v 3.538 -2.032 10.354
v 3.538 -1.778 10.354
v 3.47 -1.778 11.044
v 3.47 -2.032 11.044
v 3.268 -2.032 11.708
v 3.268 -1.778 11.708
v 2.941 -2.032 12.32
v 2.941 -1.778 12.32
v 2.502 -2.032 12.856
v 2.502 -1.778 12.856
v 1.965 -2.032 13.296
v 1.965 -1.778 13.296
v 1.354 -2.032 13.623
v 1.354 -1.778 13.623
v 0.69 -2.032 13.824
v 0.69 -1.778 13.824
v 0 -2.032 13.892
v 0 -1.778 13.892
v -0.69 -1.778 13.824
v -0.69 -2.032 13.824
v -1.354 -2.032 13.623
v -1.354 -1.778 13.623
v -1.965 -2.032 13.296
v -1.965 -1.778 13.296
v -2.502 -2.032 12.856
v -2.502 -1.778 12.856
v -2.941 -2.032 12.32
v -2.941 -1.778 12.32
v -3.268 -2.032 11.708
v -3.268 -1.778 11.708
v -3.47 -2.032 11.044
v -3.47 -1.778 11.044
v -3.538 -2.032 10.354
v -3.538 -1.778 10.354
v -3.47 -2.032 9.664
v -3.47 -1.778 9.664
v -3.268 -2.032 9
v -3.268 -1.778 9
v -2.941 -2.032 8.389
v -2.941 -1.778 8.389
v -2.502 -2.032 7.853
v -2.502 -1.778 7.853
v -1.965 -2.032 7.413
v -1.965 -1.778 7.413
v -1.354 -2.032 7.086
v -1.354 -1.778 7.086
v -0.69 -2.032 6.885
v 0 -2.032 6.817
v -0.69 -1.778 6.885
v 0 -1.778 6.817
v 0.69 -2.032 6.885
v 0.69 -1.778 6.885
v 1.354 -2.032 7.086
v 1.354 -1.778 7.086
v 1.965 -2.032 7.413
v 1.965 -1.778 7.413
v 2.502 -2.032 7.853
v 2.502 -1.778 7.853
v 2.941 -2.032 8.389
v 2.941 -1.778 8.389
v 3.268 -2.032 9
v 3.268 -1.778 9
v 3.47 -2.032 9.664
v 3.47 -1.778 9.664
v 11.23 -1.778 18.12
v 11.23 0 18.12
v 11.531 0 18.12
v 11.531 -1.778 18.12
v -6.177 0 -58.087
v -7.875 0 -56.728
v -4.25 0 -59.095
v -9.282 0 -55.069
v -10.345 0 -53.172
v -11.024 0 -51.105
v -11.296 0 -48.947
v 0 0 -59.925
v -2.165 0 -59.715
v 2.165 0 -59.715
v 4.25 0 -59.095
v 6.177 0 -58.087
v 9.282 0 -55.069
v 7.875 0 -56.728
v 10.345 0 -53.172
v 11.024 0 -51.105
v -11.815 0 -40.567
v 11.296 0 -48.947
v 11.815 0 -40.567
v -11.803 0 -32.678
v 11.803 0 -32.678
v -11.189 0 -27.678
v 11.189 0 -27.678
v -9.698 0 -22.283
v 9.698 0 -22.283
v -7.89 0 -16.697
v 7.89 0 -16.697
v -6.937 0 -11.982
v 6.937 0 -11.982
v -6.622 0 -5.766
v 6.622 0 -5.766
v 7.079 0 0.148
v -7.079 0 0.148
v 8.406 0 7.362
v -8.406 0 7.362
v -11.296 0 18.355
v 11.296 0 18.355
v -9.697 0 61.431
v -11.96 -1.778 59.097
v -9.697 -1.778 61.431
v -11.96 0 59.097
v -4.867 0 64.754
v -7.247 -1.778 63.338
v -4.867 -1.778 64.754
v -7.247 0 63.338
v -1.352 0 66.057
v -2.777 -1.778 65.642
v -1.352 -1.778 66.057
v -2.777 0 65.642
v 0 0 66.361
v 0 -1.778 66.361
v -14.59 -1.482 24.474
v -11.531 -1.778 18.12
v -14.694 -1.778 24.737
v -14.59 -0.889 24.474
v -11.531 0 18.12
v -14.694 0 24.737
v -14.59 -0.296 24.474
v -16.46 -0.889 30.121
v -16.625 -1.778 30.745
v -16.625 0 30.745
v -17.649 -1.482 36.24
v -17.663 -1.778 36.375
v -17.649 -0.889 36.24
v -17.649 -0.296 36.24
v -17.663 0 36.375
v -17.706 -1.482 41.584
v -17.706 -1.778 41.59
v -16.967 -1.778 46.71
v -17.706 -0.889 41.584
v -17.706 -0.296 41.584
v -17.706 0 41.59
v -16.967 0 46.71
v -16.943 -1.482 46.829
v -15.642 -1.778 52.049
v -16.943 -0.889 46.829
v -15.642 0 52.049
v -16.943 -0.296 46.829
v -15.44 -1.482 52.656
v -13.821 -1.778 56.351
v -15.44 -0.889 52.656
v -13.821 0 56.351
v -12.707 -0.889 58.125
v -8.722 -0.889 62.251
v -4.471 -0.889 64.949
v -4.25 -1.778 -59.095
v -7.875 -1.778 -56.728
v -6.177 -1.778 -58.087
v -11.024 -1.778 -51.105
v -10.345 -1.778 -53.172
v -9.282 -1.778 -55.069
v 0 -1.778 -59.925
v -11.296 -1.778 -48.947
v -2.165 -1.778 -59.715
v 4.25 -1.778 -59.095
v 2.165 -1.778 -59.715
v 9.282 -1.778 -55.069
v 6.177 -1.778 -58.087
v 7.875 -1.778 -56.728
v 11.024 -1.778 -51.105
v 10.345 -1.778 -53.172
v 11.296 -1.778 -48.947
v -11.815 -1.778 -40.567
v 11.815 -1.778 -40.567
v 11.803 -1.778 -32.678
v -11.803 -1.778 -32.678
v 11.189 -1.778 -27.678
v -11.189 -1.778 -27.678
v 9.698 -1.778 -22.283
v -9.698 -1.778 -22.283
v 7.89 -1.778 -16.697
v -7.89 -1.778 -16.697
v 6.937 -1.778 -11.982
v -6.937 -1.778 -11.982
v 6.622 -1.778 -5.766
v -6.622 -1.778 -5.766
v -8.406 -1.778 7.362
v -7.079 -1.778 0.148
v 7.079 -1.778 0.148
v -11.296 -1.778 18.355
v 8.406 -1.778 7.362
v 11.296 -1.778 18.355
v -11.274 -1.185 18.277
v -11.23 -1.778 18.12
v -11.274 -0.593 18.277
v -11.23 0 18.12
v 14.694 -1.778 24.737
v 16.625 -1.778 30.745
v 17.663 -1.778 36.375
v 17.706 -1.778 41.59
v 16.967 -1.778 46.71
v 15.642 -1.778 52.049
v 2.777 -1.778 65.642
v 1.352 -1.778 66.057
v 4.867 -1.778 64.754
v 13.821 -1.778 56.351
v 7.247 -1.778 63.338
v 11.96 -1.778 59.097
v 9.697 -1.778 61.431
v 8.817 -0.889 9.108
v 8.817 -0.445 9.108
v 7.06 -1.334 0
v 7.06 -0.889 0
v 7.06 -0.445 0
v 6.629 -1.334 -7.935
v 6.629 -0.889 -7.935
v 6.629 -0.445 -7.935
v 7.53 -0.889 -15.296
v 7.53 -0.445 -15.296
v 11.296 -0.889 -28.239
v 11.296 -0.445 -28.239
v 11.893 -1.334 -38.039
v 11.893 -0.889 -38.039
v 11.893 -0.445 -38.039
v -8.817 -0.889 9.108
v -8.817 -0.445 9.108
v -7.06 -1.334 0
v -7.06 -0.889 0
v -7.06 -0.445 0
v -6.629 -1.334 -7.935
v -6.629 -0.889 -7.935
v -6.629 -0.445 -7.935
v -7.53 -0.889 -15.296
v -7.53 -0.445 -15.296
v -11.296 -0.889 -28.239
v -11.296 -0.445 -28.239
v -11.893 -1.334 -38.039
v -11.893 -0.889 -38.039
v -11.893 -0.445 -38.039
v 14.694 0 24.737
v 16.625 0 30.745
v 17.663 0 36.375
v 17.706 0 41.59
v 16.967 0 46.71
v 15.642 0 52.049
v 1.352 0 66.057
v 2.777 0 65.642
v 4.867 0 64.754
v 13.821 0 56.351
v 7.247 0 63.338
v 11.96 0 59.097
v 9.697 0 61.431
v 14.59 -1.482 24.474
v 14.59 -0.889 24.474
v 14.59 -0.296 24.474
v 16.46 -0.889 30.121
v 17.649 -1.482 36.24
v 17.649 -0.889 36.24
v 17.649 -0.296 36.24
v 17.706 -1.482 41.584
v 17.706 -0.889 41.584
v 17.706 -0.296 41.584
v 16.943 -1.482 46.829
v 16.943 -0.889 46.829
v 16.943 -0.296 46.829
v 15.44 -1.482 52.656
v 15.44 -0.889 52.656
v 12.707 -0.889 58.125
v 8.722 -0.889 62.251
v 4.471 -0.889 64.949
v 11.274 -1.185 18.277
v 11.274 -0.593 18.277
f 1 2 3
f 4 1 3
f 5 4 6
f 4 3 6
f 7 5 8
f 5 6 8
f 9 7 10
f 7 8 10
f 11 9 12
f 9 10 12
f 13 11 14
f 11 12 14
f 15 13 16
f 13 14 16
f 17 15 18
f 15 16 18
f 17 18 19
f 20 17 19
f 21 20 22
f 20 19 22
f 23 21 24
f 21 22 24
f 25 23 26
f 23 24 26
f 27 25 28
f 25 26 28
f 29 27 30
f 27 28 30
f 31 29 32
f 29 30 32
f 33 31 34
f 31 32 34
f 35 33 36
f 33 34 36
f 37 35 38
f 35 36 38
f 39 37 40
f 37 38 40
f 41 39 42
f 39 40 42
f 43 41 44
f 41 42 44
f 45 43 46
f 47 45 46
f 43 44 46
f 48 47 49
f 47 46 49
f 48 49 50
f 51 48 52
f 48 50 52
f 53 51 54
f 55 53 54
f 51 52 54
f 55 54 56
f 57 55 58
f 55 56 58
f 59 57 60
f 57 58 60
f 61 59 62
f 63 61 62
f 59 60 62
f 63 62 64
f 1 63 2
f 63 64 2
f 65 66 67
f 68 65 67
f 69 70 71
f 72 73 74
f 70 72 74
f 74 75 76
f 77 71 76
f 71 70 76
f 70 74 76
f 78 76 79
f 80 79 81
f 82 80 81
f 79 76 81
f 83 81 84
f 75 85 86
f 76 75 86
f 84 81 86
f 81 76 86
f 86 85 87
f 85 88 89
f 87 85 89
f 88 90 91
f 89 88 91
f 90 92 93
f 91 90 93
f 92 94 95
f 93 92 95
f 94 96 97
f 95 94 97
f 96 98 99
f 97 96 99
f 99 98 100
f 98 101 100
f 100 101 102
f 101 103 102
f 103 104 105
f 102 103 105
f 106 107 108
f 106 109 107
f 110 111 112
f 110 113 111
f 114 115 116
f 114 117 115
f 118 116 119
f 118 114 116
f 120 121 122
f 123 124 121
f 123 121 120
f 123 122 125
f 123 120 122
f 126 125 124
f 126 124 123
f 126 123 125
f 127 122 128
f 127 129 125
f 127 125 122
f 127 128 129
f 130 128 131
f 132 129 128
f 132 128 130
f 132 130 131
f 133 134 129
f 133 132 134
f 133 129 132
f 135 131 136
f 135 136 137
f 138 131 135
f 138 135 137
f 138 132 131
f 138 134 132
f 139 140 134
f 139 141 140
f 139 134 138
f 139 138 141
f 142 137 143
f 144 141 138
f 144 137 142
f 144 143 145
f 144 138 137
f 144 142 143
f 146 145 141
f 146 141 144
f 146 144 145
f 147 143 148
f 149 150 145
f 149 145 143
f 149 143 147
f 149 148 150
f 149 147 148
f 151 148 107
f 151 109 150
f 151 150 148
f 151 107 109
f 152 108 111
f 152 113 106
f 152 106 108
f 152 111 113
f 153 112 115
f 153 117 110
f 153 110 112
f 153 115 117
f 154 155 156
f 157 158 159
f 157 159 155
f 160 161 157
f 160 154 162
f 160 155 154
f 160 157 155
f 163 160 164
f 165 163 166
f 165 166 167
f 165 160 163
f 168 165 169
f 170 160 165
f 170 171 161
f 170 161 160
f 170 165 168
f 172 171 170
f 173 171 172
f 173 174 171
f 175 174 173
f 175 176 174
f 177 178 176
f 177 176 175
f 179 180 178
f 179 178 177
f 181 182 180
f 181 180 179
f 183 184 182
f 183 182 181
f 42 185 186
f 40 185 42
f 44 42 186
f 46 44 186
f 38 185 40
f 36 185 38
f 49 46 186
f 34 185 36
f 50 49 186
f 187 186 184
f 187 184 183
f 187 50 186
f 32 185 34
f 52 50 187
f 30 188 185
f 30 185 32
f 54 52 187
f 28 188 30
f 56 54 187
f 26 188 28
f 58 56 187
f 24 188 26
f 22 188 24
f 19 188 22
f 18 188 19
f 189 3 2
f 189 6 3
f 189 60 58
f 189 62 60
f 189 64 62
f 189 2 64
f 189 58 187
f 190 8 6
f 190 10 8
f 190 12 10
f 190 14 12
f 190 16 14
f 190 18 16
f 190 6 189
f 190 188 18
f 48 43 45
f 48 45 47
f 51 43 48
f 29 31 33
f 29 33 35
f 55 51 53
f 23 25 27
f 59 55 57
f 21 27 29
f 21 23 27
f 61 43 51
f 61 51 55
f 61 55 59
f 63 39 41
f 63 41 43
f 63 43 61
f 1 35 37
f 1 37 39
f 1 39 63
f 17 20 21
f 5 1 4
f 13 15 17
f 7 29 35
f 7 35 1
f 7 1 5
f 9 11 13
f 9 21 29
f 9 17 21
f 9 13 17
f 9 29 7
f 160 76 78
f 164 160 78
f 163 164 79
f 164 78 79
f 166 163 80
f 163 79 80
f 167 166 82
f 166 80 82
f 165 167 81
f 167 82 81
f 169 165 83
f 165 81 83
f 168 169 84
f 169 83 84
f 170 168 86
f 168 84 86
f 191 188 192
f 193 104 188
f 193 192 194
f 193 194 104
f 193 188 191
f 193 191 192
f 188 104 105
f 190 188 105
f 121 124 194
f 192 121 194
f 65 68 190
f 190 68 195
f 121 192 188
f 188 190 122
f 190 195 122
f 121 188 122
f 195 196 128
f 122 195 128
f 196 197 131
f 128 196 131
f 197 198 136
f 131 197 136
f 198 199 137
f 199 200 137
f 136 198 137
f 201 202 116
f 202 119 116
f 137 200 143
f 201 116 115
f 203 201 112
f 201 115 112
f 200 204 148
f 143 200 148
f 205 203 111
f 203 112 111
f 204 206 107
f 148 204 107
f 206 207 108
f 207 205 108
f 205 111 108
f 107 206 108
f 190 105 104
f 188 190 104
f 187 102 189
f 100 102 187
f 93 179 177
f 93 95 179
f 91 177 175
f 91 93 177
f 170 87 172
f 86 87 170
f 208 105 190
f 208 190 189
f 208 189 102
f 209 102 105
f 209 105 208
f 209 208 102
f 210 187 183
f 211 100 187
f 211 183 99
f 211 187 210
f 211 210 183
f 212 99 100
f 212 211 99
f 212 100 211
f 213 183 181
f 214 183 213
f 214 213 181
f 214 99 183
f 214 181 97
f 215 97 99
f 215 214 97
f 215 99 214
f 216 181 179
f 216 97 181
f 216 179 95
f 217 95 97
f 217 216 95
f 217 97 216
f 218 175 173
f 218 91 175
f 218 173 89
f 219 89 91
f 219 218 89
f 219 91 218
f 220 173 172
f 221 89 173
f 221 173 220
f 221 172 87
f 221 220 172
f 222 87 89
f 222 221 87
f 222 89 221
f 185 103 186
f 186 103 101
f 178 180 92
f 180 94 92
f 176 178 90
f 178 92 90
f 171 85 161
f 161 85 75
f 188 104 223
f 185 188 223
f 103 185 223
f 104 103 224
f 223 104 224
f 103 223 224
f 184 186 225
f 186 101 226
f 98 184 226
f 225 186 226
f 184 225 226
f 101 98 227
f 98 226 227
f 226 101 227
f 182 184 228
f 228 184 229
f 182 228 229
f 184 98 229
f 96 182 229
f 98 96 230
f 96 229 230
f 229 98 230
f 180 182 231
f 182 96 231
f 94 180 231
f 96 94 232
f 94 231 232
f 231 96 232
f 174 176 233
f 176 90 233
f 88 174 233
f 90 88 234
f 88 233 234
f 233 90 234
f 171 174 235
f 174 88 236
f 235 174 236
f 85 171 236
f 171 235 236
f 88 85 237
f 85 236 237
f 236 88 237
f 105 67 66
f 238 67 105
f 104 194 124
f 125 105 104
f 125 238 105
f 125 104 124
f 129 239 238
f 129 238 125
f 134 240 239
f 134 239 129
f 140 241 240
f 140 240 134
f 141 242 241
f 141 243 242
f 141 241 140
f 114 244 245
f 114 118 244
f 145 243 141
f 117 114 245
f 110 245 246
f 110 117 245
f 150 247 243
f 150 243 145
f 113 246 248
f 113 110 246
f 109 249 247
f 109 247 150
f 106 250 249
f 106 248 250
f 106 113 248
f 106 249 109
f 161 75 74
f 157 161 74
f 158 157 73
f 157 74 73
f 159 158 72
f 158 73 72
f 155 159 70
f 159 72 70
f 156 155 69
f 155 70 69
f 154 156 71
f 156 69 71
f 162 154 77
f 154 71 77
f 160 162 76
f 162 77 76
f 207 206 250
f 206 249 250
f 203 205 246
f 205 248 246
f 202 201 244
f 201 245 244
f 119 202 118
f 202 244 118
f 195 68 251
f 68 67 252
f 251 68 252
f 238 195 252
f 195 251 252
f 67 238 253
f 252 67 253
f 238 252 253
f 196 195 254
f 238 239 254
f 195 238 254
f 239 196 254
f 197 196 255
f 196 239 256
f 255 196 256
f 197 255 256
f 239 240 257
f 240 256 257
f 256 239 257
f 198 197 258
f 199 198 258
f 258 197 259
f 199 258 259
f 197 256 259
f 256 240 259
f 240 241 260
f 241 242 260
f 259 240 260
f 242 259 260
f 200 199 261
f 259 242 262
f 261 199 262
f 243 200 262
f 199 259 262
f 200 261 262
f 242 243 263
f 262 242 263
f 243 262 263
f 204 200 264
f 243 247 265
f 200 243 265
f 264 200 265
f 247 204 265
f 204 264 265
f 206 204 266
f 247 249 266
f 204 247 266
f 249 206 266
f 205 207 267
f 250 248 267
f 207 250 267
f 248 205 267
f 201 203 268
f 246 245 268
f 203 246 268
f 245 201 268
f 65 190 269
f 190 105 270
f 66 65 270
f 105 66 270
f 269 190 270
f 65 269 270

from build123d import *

# Parameters (mm, degrees)
F2_DEPTH = 1.778
F3_R     = 3.5376885561
F4_DEPTH = 0.254


with BuildPart() as f2:
    # F1 (on face) → F2 (new body)
    with BuildSketch(Plane.XZ):
        with BuildLine():
            add(Edge.make_bspline(
                [(-11.5308519453, 18.1199125946), (-12.5632574999, 20.0211138596), (-14.9147056221, 24.4291977931), (-18.4606353402, 36.4233259277), (-17.2261789221, 46.7645790924), (-14.0583007371, 58.6815578988), (-4.8286528791, 65.3213674178), (-1.3724477125, 66.0694099207), (0, 66.361233592)],
                knots=[0, 0, 0, 0, 0.1450382977, 0.3354750356, 0.5134059115, 0.7031070309, 0.8817336505, 1, 1, 1, 1], degree=3))
            Line((-11.5308519453, 18.1199125946), (-11.2295764155, 18.1199125946))
            add(Edge.make_bspline(
                [(-11.2955272198, 18.3552373201), (-11.2735429638, 18.2767956188), (-11.2515587078, 18.1983539175), (-11.2295764155, 18.1199125946)],
                knots=[0, 0, 0, 0, 0.0033439465, 0.0033439465, 0.0033439465, 0.0033439465], degree=3))
            Line((-11.2955272198, 18.3552373201), (0, 18.3552373201))
            Line((0, 18.3552373201), (11.2955272198, 18.3552373201))
            add(Edge.make_bspline(
                [(11.2955272198, 18.3552373201), (11.2735429638, 18.2767956188), (11.2515587078, 18.1983539175), (11.2295764155, 18.1199125946)],
                knots=[0, 0, 0, 0, 0.0033439465, 0.0033439465, 0.0033439465, 0.0033439465], degree=3))
            Line((11.2295764155, 18.1199125946), (11.5308519453, 18.1199125946))
            add(Edge.make_bspline(
                [(11.5308519453, 18.1199125946), (12.5632574999, 20.0211138596), (14.9147056221, 24.4291977931), (18.4606353402, 36.4233259277), (17.2261789221, 46.7645790924), (14.0583007371, 58.6815578988), (4.8286528791, 65.3213674178), (1.3724477125, 66.0694099207), (0, 66.361233592)],
                knots=[0, 0, 0, 0, 0.1450382977, 0.3354750356, 0.5134059115, 0.7031070309, 0.8817336505, 1, 1, 1, 1], degree=3))
        make_face()
    extrude(amount=F2_DEPTH)


with BuildPart() as f2b:
    # F0 (on Front) → F2, piece 2 (new body)
    with BuildSketch(Plane.XZ):
        with BuildLine():
            Line((11.2955272198, 18.3552373201), (0, 18.3552373201))
            Line((0, 18.3552373201), (-11.2955272198, 18.3552373201))
            add(Edge.make_bspline(
                [(-11.2955272198, 18.3552373201), (-9.5634787199, 12.1751404741), (-6.2703010662, 0.4248015931), (-6.5280857797, -15.5867064637), (-12.7856682908, -28.1909512846), (-11.8264331141, -41.5522479919), (-11.2955272198, -48.9472970366)],
                knots=[0, 0, 0, 0, 0.263455699, 0.500913468, 0.7237716172, 1, 1, 1, 1], degree=3))
            ThreePointArc((-11.2955272198, -48.9472970366), (-7.8754450124, -56.7282144149), (0, -59.9246191781))
            ThreePointArc((0, -59.9246191781), (7.8754450124, -56.7282144149), (11.2955272198, -48.9472970366))
            add(Edge.make_bspline(
                [(11.2955272198, 18.3552373201), (9.5634787199, 12.1751404741), (6.2703010662, 0.4248015931), (6.5280857797, -15.5867064637), (12.7856682908, -28.1909512846), (11.8264331141, -41.5522479919), (11.2955272198, -48.9472970366)],
                knots=[0, 0, 0, 0, 0.263455699, 0.500913468, 0.7237716172, 1, 1, 1, 1], degree=3))
        make_face()
    extrude(amount=F2_DEPTH)

    # F3 (on face) → F4 (join)
    with BuildSketch(Plane.XZ.offset(1.778)):
        with Locations((0, 10.3542357683)):
            Circle(F3_R)
    extrude(amount=F4_DEPTH)


solid = Compound([f2.part, f2b.part])
